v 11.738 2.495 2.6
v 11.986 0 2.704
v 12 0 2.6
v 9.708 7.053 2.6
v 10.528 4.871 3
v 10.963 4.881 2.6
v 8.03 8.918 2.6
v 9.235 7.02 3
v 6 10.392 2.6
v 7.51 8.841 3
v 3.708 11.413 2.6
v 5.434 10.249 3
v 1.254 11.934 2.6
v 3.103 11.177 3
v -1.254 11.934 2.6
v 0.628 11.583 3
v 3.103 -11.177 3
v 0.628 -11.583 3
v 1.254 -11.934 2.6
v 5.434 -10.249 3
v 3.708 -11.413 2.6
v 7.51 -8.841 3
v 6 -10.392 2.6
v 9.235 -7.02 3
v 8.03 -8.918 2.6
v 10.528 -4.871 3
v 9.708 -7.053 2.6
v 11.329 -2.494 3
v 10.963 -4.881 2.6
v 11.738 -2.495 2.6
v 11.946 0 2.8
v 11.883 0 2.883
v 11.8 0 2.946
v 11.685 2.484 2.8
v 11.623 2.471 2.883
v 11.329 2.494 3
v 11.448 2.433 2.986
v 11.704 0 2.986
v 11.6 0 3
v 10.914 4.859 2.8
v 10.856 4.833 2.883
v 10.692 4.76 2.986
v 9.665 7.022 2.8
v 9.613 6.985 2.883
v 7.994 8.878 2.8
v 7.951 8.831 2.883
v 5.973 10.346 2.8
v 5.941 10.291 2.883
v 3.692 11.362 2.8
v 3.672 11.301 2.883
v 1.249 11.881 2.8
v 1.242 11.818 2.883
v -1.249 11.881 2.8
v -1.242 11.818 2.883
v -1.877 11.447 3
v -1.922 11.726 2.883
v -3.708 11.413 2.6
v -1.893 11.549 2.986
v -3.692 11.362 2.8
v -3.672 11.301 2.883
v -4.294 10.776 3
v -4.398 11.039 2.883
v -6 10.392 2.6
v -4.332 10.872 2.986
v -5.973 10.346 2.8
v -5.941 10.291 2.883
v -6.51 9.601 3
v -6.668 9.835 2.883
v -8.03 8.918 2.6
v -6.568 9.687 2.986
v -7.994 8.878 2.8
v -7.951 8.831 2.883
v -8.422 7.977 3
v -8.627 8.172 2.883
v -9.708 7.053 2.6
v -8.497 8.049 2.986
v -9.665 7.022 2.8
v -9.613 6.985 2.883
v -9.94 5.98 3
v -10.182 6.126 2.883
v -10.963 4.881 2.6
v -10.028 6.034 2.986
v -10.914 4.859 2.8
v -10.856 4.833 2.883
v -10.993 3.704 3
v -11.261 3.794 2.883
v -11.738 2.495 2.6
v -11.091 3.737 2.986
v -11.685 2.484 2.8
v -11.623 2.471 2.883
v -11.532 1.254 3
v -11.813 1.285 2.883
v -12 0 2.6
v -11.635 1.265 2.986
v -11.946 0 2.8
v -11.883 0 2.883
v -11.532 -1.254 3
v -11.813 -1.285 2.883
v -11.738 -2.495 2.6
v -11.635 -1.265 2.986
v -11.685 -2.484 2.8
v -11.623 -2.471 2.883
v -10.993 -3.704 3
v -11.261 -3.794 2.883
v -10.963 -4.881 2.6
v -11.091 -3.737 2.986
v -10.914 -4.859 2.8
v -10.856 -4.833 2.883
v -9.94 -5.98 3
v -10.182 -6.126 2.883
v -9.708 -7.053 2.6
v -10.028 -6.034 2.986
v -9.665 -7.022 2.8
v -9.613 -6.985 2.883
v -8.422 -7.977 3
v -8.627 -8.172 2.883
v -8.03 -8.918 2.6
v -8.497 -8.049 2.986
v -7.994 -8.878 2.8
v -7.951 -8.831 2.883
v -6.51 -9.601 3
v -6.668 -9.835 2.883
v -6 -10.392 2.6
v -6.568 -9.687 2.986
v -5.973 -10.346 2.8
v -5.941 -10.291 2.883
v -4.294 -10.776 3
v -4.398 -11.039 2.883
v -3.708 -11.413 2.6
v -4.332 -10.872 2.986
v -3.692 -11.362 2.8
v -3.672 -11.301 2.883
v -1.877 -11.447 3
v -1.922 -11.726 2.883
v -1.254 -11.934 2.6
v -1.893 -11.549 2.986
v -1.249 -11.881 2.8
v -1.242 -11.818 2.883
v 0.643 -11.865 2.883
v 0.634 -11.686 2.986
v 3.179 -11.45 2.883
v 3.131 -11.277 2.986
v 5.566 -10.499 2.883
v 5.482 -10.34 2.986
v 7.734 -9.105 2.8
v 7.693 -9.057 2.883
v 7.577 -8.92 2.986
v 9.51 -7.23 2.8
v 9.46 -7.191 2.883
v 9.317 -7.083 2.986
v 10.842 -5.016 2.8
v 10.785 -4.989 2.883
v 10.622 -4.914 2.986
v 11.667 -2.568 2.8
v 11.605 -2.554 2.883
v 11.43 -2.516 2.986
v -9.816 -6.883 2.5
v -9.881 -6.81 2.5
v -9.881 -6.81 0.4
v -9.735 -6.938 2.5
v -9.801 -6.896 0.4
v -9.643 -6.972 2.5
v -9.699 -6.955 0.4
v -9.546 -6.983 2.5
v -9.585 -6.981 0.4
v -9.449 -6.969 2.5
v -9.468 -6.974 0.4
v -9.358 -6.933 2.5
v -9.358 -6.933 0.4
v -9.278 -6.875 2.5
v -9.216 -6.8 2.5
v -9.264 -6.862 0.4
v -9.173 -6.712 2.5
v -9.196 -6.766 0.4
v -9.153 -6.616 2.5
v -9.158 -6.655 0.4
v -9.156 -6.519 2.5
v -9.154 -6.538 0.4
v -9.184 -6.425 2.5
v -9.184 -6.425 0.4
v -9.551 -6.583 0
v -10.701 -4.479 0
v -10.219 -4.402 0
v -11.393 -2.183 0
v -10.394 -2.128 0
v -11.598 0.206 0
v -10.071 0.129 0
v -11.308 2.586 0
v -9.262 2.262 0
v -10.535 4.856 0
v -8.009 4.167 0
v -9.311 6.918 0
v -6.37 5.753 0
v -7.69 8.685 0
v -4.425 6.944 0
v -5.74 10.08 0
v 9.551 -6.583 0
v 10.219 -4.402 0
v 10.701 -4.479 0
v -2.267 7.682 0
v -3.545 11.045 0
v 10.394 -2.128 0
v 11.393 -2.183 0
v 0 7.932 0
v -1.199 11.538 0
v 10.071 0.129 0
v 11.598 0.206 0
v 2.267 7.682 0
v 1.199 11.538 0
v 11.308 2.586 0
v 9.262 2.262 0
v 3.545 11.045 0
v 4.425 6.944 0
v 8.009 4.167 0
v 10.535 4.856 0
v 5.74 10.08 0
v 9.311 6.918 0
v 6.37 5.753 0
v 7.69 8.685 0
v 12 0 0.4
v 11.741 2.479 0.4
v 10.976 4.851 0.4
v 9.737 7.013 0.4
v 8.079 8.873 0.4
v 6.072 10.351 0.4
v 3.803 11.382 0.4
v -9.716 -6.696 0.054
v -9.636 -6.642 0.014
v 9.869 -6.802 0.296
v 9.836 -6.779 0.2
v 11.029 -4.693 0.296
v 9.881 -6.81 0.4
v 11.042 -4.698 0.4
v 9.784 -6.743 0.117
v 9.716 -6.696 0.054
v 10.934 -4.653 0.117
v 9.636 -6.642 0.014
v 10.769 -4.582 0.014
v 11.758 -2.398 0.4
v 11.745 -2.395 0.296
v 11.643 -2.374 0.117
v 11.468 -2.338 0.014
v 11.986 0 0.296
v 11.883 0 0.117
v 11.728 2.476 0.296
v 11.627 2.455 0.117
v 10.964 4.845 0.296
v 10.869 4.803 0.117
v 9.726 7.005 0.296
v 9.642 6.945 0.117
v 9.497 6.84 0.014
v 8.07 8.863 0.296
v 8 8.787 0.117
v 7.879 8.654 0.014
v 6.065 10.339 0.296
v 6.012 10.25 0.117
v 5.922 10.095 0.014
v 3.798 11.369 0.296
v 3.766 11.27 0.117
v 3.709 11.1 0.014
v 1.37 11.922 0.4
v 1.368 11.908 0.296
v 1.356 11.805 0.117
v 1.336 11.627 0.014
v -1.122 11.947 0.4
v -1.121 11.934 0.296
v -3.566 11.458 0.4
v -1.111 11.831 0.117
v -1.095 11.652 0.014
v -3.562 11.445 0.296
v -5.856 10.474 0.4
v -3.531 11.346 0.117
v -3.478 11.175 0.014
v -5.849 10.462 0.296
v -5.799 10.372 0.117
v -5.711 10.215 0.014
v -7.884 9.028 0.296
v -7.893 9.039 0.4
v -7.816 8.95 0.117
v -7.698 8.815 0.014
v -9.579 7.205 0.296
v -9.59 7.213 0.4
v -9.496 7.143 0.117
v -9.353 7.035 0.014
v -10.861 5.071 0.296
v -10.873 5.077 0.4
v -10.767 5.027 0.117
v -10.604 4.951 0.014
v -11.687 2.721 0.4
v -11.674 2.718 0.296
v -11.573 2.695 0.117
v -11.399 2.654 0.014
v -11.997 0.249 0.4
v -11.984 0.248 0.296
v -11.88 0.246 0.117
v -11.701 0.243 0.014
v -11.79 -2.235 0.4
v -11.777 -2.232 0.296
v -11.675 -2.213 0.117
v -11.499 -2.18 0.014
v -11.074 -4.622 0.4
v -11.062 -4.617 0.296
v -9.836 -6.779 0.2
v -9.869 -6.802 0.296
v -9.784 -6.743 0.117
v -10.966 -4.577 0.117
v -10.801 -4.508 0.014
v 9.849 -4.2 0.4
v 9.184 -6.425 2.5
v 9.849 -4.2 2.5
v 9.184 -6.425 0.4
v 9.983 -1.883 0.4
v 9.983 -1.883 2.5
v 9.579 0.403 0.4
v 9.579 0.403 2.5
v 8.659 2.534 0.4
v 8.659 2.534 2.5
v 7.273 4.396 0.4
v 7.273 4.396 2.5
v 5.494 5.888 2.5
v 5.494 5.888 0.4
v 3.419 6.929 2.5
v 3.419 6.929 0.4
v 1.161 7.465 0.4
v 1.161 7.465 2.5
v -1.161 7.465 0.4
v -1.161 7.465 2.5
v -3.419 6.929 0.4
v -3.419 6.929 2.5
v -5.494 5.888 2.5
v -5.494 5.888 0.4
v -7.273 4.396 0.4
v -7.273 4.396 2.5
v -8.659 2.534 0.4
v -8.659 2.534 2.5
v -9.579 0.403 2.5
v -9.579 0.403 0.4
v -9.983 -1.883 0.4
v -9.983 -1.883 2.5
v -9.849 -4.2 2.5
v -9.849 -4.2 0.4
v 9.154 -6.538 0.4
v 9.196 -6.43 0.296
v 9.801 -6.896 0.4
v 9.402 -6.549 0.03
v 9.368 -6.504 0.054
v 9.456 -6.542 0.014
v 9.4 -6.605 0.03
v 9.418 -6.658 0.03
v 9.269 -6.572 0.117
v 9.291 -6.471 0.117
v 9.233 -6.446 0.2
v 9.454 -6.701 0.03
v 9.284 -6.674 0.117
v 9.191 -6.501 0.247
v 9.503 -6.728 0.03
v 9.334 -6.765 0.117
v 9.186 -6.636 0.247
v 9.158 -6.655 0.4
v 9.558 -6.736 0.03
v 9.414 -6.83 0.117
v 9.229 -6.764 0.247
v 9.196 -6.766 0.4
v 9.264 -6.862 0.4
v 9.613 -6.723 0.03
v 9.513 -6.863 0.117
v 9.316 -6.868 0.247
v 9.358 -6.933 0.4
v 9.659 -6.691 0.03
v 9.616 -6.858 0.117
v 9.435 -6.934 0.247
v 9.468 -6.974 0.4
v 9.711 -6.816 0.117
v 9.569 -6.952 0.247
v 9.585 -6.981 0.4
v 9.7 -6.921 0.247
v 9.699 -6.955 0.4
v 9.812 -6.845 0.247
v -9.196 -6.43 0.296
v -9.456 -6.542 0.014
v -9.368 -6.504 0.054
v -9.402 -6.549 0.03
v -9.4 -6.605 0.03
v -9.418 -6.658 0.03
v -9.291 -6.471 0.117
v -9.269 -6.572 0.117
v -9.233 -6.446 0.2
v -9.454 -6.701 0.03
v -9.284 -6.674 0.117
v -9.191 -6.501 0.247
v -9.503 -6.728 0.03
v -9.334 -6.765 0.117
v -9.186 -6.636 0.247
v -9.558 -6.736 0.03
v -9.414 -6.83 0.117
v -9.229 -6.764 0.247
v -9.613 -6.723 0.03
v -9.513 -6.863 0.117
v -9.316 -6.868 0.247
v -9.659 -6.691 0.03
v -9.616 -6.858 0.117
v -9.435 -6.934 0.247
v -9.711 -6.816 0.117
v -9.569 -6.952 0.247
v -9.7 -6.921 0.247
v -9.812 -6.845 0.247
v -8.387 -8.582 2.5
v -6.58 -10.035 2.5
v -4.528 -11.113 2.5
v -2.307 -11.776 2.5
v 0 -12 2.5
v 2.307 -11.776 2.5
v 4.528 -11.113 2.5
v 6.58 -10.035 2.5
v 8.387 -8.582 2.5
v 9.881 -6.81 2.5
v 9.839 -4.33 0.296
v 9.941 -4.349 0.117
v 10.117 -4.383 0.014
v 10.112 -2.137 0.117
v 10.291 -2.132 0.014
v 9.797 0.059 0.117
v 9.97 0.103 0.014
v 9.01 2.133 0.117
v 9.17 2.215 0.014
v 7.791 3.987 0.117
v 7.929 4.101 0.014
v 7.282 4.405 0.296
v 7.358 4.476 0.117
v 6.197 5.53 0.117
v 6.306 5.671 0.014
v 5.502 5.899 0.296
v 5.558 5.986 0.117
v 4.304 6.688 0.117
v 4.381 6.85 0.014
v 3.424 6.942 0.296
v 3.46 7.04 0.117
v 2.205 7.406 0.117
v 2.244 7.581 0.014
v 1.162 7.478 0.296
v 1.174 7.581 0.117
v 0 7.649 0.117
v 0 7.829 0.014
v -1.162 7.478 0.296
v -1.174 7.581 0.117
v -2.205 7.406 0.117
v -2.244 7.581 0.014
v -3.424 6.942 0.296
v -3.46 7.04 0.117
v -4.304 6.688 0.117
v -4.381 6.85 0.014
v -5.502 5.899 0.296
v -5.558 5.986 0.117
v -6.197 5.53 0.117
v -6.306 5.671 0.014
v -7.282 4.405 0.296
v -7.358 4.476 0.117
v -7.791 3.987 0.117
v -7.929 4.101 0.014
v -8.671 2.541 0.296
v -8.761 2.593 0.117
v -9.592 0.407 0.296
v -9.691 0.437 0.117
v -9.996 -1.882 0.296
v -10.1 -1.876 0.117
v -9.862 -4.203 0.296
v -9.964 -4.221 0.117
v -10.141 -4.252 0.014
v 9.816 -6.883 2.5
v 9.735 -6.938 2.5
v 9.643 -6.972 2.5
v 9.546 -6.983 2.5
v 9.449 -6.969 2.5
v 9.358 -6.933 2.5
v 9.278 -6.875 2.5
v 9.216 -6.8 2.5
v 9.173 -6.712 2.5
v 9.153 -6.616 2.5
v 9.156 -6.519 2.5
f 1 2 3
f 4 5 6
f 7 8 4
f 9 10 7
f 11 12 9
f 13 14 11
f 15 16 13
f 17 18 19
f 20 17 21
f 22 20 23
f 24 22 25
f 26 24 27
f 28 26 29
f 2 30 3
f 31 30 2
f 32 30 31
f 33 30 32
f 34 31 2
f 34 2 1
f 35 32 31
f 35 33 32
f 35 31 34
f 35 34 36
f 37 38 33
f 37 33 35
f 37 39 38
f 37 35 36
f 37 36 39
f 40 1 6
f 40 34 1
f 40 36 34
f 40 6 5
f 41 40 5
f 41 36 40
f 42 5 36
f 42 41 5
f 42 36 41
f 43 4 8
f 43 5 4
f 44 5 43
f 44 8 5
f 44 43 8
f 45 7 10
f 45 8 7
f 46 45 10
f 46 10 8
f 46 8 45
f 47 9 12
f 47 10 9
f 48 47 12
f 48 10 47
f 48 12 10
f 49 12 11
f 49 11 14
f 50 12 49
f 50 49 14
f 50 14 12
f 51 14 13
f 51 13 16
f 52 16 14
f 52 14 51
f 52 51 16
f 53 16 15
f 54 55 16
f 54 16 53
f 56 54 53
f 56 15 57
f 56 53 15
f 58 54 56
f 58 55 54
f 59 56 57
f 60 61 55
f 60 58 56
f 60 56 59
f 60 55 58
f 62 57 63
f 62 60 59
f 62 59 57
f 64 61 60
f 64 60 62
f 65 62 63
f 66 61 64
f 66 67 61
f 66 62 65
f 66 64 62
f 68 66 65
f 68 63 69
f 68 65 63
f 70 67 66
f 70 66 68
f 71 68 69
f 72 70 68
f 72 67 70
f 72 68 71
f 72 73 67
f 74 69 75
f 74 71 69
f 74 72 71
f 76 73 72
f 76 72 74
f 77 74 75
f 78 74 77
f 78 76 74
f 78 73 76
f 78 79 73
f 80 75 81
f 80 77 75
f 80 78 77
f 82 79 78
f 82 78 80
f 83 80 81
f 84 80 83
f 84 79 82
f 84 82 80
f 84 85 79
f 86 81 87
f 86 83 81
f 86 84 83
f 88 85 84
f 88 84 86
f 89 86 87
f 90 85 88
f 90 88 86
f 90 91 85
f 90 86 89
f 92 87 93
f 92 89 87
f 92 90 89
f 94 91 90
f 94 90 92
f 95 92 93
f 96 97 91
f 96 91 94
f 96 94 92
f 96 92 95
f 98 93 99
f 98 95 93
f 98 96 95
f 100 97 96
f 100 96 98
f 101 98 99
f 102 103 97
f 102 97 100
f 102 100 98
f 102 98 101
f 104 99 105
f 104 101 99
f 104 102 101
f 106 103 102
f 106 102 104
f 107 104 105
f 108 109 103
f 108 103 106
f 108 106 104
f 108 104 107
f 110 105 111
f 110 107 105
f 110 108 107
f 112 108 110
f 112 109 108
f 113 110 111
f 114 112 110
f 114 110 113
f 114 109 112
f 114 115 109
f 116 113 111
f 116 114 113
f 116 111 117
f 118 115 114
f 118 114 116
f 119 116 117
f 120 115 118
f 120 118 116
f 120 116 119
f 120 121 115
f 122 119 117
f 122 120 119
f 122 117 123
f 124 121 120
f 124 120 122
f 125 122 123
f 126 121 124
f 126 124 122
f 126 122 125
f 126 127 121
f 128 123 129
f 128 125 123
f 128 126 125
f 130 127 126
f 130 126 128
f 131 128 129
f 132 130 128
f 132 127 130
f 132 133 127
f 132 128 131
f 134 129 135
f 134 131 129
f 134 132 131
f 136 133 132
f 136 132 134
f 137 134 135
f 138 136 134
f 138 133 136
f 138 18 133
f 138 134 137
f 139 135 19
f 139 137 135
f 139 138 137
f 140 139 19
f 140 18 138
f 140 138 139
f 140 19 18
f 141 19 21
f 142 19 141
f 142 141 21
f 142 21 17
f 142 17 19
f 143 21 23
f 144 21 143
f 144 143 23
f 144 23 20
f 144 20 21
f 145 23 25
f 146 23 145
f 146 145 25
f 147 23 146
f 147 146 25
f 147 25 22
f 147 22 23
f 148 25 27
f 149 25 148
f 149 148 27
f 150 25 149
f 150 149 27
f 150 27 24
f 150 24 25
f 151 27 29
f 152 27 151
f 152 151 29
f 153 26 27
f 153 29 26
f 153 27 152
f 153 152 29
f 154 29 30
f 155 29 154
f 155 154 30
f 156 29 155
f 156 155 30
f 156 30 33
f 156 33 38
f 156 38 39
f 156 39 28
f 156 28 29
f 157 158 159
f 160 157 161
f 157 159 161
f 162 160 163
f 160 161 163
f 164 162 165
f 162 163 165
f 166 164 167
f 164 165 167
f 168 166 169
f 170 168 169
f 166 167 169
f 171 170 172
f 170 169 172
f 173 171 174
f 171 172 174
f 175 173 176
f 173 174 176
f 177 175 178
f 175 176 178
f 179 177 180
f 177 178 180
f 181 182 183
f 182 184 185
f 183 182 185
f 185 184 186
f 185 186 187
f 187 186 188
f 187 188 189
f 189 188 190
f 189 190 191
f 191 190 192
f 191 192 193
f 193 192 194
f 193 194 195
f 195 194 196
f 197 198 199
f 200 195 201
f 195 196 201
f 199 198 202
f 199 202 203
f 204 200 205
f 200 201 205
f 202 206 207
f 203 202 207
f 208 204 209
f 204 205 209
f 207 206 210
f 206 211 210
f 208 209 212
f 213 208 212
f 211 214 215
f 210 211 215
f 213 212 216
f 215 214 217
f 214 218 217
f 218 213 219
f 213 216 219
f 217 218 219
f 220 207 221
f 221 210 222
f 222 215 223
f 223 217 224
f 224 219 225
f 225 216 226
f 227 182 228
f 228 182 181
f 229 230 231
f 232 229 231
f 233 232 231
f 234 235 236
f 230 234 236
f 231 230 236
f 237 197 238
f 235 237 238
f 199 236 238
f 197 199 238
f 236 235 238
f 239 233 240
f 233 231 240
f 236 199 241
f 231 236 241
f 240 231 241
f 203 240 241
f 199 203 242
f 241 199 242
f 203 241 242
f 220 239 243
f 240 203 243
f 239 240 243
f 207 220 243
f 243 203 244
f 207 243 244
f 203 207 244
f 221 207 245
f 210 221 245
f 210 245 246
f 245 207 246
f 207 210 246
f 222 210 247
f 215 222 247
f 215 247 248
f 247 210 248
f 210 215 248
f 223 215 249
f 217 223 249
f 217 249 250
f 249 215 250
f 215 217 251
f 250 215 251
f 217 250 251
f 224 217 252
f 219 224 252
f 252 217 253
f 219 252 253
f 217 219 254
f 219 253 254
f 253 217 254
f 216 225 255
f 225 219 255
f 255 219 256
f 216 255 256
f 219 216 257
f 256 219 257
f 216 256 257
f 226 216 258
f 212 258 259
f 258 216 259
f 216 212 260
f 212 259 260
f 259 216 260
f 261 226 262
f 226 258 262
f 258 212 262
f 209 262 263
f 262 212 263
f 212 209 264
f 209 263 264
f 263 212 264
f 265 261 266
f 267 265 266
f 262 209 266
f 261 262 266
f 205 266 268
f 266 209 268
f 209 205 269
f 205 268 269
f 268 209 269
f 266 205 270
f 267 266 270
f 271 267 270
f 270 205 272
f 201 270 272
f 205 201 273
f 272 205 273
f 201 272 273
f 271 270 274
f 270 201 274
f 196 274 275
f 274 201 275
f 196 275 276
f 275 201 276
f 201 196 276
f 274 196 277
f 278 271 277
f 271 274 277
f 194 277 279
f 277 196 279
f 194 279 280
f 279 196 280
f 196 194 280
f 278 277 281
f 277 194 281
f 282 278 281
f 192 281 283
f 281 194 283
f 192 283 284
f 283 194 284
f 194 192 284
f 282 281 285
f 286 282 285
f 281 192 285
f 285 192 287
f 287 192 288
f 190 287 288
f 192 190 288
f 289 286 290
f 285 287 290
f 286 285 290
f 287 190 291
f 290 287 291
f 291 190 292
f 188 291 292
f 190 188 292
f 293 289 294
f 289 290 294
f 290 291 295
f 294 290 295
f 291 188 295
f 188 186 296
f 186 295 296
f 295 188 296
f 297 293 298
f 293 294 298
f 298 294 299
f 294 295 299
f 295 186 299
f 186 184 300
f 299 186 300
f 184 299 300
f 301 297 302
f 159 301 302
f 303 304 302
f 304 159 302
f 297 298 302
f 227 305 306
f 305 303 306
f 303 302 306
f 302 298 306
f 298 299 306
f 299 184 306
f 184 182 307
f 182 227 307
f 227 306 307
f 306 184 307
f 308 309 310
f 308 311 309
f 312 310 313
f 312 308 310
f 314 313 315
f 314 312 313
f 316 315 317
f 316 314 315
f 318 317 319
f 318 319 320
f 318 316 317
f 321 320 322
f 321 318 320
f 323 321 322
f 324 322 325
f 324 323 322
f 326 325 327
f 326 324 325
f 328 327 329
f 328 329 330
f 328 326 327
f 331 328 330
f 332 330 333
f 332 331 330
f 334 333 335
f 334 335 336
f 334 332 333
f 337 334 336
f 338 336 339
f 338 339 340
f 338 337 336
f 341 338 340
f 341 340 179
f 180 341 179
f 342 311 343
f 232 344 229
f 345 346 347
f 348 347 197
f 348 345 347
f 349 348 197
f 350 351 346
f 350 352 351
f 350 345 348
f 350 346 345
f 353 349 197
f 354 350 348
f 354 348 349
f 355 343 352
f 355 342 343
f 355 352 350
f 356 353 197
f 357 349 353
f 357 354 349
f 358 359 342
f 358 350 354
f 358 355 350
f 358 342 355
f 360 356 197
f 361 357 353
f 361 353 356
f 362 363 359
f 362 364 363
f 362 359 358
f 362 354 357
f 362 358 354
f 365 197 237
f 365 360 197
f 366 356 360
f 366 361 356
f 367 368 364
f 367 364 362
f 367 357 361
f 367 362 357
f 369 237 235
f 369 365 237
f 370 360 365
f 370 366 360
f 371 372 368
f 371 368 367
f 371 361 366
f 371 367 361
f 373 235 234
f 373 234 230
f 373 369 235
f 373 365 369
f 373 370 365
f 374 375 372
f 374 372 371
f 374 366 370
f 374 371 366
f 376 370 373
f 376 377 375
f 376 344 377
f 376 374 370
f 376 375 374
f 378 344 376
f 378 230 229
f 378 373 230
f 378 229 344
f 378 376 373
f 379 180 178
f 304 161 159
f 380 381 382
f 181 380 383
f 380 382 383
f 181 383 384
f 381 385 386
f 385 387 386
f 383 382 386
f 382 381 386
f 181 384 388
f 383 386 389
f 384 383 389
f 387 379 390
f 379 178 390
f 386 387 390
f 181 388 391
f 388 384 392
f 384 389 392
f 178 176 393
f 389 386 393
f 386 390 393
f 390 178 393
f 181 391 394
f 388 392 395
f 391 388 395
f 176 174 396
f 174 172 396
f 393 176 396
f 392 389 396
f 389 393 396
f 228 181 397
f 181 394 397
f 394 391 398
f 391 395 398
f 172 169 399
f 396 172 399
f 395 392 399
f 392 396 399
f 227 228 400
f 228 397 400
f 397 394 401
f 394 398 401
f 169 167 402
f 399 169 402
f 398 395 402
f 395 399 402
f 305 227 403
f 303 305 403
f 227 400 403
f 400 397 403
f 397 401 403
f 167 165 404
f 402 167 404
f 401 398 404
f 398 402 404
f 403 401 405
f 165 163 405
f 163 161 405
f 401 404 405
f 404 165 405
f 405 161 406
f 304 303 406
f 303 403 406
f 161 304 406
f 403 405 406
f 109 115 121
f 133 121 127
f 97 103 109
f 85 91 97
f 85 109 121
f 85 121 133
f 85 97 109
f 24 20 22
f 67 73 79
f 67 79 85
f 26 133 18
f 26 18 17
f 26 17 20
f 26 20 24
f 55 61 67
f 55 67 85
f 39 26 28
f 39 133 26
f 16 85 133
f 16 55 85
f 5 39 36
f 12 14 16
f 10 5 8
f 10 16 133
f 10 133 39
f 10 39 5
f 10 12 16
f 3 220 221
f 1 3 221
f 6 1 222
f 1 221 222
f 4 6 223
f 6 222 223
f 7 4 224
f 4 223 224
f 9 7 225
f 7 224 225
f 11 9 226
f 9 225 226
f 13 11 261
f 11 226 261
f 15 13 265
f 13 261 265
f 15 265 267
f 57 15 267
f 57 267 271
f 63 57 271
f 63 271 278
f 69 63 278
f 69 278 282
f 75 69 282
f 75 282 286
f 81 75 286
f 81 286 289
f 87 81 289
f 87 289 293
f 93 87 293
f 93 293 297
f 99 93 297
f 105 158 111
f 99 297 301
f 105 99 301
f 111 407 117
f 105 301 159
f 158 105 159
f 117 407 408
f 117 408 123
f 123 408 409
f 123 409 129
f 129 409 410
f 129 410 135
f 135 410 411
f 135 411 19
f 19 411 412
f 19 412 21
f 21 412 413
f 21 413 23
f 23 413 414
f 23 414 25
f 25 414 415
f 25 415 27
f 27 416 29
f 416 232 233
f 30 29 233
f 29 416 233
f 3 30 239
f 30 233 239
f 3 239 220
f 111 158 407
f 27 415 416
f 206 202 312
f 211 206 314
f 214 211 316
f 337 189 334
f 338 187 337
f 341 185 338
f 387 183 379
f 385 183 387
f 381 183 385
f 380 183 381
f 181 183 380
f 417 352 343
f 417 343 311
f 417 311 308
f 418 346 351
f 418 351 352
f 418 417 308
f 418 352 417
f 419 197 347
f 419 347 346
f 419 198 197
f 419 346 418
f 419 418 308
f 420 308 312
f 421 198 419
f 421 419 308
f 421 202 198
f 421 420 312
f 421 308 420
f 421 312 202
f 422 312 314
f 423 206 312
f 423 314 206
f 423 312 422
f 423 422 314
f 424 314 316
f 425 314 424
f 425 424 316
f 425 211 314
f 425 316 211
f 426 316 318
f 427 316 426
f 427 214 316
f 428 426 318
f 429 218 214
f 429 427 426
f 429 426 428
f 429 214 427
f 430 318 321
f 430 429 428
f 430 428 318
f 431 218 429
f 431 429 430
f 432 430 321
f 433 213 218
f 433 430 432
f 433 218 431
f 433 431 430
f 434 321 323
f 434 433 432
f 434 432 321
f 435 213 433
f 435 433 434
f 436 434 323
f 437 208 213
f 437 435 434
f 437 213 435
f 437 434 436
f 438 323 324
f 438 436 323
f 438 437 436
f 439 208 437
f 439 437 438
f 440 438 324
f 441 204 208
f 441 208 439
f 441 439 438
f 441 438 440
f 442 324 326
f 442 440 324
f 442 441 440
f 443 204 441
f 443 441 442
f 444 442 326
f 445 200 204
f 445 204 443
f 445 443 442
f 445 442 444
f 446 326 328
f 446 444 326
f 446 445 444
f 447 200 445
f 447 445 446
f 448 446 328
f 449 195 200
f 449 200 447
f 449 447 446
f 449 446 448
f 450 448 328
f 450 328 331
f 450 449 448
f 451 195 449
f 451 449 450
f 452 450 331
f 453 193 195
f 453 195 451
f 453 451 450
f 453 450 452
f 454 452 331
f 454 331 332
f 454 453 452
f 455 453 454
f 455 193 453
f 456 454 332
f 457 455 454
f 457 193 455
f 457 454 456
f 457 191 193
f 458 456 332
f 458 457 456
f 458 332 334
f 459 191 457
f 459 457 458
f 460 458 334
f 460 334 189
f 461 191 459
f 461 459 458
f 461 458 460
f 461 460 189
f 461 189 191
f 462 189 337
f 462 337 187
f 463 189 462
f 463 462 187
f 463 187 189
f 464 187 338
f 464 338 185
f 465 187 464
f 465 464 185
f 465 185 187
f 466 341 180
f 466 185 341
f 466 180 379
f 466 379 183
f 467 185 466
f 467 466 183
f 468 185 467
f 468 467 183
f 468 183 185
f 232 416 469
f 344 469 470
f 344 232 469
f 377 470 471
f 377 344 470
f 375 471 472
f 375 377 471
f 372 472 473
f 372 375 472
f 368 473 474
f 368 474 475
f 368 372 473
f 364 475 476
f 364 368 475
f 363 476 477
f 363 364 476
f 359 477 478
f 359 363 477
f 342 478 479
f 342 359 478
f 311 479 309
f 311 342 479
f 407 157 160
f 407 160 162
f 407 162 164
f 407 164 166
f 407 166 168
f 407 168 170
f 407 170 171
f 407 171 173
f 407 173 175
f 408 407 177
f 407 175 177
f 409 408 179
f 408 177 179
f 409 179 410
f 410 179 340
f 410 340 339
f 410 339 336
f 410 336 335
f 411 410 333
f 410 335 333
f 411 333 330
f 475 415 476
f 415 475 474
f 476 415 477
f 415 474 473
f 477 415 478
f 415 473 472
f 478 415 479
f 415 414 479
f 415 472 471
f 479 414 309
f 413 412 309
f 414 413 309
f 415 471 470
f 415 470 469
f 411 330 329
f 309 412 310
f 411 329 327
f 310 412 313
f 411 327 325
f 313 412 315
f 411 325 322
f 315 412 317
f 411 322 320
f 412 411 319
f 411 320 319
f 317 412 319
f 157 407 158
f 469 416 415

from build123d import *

# Parameters (mm, degrees)
SKETCH_R     = 12
PAD_DEPTH    = 3
SKETCH001_R  = 10
POCKET_DEPTH = 2.5
FILLET_R     = 0.4


with BuildPart() as part:
    # Sketch → Pad (new body)
    with BuildSketch(Plane.XY):
        Circle(SKETCH_R)
    extrude(amount=PAD_DEPTH)

    # Sketch001 → Pocket (cut)
    with BuildSketch(Plane.XY):
        with Locations((0, -2.467762)):
            Circle(SKETCH001_R)
    extrude(amount=POCKET_DEPTH, mode=Mode.SUBTRACT)

    # Fillet
    fillet_edges = [part.edges().sort_by_distance(p)[0] for p in [
        (-12, 0, 3),
        (-4.240751, 6.588508, 0),
        (-5.794891, 10.508056, 0),
        (9.05627, -6.708513, 0),
        (-6.403207, -10.14884, 1.25),
        (6.403207, -10.14884, 1.25),
    ]]
    fillet(fillet_edges, radius=FILLET_R)


solid = part.part
